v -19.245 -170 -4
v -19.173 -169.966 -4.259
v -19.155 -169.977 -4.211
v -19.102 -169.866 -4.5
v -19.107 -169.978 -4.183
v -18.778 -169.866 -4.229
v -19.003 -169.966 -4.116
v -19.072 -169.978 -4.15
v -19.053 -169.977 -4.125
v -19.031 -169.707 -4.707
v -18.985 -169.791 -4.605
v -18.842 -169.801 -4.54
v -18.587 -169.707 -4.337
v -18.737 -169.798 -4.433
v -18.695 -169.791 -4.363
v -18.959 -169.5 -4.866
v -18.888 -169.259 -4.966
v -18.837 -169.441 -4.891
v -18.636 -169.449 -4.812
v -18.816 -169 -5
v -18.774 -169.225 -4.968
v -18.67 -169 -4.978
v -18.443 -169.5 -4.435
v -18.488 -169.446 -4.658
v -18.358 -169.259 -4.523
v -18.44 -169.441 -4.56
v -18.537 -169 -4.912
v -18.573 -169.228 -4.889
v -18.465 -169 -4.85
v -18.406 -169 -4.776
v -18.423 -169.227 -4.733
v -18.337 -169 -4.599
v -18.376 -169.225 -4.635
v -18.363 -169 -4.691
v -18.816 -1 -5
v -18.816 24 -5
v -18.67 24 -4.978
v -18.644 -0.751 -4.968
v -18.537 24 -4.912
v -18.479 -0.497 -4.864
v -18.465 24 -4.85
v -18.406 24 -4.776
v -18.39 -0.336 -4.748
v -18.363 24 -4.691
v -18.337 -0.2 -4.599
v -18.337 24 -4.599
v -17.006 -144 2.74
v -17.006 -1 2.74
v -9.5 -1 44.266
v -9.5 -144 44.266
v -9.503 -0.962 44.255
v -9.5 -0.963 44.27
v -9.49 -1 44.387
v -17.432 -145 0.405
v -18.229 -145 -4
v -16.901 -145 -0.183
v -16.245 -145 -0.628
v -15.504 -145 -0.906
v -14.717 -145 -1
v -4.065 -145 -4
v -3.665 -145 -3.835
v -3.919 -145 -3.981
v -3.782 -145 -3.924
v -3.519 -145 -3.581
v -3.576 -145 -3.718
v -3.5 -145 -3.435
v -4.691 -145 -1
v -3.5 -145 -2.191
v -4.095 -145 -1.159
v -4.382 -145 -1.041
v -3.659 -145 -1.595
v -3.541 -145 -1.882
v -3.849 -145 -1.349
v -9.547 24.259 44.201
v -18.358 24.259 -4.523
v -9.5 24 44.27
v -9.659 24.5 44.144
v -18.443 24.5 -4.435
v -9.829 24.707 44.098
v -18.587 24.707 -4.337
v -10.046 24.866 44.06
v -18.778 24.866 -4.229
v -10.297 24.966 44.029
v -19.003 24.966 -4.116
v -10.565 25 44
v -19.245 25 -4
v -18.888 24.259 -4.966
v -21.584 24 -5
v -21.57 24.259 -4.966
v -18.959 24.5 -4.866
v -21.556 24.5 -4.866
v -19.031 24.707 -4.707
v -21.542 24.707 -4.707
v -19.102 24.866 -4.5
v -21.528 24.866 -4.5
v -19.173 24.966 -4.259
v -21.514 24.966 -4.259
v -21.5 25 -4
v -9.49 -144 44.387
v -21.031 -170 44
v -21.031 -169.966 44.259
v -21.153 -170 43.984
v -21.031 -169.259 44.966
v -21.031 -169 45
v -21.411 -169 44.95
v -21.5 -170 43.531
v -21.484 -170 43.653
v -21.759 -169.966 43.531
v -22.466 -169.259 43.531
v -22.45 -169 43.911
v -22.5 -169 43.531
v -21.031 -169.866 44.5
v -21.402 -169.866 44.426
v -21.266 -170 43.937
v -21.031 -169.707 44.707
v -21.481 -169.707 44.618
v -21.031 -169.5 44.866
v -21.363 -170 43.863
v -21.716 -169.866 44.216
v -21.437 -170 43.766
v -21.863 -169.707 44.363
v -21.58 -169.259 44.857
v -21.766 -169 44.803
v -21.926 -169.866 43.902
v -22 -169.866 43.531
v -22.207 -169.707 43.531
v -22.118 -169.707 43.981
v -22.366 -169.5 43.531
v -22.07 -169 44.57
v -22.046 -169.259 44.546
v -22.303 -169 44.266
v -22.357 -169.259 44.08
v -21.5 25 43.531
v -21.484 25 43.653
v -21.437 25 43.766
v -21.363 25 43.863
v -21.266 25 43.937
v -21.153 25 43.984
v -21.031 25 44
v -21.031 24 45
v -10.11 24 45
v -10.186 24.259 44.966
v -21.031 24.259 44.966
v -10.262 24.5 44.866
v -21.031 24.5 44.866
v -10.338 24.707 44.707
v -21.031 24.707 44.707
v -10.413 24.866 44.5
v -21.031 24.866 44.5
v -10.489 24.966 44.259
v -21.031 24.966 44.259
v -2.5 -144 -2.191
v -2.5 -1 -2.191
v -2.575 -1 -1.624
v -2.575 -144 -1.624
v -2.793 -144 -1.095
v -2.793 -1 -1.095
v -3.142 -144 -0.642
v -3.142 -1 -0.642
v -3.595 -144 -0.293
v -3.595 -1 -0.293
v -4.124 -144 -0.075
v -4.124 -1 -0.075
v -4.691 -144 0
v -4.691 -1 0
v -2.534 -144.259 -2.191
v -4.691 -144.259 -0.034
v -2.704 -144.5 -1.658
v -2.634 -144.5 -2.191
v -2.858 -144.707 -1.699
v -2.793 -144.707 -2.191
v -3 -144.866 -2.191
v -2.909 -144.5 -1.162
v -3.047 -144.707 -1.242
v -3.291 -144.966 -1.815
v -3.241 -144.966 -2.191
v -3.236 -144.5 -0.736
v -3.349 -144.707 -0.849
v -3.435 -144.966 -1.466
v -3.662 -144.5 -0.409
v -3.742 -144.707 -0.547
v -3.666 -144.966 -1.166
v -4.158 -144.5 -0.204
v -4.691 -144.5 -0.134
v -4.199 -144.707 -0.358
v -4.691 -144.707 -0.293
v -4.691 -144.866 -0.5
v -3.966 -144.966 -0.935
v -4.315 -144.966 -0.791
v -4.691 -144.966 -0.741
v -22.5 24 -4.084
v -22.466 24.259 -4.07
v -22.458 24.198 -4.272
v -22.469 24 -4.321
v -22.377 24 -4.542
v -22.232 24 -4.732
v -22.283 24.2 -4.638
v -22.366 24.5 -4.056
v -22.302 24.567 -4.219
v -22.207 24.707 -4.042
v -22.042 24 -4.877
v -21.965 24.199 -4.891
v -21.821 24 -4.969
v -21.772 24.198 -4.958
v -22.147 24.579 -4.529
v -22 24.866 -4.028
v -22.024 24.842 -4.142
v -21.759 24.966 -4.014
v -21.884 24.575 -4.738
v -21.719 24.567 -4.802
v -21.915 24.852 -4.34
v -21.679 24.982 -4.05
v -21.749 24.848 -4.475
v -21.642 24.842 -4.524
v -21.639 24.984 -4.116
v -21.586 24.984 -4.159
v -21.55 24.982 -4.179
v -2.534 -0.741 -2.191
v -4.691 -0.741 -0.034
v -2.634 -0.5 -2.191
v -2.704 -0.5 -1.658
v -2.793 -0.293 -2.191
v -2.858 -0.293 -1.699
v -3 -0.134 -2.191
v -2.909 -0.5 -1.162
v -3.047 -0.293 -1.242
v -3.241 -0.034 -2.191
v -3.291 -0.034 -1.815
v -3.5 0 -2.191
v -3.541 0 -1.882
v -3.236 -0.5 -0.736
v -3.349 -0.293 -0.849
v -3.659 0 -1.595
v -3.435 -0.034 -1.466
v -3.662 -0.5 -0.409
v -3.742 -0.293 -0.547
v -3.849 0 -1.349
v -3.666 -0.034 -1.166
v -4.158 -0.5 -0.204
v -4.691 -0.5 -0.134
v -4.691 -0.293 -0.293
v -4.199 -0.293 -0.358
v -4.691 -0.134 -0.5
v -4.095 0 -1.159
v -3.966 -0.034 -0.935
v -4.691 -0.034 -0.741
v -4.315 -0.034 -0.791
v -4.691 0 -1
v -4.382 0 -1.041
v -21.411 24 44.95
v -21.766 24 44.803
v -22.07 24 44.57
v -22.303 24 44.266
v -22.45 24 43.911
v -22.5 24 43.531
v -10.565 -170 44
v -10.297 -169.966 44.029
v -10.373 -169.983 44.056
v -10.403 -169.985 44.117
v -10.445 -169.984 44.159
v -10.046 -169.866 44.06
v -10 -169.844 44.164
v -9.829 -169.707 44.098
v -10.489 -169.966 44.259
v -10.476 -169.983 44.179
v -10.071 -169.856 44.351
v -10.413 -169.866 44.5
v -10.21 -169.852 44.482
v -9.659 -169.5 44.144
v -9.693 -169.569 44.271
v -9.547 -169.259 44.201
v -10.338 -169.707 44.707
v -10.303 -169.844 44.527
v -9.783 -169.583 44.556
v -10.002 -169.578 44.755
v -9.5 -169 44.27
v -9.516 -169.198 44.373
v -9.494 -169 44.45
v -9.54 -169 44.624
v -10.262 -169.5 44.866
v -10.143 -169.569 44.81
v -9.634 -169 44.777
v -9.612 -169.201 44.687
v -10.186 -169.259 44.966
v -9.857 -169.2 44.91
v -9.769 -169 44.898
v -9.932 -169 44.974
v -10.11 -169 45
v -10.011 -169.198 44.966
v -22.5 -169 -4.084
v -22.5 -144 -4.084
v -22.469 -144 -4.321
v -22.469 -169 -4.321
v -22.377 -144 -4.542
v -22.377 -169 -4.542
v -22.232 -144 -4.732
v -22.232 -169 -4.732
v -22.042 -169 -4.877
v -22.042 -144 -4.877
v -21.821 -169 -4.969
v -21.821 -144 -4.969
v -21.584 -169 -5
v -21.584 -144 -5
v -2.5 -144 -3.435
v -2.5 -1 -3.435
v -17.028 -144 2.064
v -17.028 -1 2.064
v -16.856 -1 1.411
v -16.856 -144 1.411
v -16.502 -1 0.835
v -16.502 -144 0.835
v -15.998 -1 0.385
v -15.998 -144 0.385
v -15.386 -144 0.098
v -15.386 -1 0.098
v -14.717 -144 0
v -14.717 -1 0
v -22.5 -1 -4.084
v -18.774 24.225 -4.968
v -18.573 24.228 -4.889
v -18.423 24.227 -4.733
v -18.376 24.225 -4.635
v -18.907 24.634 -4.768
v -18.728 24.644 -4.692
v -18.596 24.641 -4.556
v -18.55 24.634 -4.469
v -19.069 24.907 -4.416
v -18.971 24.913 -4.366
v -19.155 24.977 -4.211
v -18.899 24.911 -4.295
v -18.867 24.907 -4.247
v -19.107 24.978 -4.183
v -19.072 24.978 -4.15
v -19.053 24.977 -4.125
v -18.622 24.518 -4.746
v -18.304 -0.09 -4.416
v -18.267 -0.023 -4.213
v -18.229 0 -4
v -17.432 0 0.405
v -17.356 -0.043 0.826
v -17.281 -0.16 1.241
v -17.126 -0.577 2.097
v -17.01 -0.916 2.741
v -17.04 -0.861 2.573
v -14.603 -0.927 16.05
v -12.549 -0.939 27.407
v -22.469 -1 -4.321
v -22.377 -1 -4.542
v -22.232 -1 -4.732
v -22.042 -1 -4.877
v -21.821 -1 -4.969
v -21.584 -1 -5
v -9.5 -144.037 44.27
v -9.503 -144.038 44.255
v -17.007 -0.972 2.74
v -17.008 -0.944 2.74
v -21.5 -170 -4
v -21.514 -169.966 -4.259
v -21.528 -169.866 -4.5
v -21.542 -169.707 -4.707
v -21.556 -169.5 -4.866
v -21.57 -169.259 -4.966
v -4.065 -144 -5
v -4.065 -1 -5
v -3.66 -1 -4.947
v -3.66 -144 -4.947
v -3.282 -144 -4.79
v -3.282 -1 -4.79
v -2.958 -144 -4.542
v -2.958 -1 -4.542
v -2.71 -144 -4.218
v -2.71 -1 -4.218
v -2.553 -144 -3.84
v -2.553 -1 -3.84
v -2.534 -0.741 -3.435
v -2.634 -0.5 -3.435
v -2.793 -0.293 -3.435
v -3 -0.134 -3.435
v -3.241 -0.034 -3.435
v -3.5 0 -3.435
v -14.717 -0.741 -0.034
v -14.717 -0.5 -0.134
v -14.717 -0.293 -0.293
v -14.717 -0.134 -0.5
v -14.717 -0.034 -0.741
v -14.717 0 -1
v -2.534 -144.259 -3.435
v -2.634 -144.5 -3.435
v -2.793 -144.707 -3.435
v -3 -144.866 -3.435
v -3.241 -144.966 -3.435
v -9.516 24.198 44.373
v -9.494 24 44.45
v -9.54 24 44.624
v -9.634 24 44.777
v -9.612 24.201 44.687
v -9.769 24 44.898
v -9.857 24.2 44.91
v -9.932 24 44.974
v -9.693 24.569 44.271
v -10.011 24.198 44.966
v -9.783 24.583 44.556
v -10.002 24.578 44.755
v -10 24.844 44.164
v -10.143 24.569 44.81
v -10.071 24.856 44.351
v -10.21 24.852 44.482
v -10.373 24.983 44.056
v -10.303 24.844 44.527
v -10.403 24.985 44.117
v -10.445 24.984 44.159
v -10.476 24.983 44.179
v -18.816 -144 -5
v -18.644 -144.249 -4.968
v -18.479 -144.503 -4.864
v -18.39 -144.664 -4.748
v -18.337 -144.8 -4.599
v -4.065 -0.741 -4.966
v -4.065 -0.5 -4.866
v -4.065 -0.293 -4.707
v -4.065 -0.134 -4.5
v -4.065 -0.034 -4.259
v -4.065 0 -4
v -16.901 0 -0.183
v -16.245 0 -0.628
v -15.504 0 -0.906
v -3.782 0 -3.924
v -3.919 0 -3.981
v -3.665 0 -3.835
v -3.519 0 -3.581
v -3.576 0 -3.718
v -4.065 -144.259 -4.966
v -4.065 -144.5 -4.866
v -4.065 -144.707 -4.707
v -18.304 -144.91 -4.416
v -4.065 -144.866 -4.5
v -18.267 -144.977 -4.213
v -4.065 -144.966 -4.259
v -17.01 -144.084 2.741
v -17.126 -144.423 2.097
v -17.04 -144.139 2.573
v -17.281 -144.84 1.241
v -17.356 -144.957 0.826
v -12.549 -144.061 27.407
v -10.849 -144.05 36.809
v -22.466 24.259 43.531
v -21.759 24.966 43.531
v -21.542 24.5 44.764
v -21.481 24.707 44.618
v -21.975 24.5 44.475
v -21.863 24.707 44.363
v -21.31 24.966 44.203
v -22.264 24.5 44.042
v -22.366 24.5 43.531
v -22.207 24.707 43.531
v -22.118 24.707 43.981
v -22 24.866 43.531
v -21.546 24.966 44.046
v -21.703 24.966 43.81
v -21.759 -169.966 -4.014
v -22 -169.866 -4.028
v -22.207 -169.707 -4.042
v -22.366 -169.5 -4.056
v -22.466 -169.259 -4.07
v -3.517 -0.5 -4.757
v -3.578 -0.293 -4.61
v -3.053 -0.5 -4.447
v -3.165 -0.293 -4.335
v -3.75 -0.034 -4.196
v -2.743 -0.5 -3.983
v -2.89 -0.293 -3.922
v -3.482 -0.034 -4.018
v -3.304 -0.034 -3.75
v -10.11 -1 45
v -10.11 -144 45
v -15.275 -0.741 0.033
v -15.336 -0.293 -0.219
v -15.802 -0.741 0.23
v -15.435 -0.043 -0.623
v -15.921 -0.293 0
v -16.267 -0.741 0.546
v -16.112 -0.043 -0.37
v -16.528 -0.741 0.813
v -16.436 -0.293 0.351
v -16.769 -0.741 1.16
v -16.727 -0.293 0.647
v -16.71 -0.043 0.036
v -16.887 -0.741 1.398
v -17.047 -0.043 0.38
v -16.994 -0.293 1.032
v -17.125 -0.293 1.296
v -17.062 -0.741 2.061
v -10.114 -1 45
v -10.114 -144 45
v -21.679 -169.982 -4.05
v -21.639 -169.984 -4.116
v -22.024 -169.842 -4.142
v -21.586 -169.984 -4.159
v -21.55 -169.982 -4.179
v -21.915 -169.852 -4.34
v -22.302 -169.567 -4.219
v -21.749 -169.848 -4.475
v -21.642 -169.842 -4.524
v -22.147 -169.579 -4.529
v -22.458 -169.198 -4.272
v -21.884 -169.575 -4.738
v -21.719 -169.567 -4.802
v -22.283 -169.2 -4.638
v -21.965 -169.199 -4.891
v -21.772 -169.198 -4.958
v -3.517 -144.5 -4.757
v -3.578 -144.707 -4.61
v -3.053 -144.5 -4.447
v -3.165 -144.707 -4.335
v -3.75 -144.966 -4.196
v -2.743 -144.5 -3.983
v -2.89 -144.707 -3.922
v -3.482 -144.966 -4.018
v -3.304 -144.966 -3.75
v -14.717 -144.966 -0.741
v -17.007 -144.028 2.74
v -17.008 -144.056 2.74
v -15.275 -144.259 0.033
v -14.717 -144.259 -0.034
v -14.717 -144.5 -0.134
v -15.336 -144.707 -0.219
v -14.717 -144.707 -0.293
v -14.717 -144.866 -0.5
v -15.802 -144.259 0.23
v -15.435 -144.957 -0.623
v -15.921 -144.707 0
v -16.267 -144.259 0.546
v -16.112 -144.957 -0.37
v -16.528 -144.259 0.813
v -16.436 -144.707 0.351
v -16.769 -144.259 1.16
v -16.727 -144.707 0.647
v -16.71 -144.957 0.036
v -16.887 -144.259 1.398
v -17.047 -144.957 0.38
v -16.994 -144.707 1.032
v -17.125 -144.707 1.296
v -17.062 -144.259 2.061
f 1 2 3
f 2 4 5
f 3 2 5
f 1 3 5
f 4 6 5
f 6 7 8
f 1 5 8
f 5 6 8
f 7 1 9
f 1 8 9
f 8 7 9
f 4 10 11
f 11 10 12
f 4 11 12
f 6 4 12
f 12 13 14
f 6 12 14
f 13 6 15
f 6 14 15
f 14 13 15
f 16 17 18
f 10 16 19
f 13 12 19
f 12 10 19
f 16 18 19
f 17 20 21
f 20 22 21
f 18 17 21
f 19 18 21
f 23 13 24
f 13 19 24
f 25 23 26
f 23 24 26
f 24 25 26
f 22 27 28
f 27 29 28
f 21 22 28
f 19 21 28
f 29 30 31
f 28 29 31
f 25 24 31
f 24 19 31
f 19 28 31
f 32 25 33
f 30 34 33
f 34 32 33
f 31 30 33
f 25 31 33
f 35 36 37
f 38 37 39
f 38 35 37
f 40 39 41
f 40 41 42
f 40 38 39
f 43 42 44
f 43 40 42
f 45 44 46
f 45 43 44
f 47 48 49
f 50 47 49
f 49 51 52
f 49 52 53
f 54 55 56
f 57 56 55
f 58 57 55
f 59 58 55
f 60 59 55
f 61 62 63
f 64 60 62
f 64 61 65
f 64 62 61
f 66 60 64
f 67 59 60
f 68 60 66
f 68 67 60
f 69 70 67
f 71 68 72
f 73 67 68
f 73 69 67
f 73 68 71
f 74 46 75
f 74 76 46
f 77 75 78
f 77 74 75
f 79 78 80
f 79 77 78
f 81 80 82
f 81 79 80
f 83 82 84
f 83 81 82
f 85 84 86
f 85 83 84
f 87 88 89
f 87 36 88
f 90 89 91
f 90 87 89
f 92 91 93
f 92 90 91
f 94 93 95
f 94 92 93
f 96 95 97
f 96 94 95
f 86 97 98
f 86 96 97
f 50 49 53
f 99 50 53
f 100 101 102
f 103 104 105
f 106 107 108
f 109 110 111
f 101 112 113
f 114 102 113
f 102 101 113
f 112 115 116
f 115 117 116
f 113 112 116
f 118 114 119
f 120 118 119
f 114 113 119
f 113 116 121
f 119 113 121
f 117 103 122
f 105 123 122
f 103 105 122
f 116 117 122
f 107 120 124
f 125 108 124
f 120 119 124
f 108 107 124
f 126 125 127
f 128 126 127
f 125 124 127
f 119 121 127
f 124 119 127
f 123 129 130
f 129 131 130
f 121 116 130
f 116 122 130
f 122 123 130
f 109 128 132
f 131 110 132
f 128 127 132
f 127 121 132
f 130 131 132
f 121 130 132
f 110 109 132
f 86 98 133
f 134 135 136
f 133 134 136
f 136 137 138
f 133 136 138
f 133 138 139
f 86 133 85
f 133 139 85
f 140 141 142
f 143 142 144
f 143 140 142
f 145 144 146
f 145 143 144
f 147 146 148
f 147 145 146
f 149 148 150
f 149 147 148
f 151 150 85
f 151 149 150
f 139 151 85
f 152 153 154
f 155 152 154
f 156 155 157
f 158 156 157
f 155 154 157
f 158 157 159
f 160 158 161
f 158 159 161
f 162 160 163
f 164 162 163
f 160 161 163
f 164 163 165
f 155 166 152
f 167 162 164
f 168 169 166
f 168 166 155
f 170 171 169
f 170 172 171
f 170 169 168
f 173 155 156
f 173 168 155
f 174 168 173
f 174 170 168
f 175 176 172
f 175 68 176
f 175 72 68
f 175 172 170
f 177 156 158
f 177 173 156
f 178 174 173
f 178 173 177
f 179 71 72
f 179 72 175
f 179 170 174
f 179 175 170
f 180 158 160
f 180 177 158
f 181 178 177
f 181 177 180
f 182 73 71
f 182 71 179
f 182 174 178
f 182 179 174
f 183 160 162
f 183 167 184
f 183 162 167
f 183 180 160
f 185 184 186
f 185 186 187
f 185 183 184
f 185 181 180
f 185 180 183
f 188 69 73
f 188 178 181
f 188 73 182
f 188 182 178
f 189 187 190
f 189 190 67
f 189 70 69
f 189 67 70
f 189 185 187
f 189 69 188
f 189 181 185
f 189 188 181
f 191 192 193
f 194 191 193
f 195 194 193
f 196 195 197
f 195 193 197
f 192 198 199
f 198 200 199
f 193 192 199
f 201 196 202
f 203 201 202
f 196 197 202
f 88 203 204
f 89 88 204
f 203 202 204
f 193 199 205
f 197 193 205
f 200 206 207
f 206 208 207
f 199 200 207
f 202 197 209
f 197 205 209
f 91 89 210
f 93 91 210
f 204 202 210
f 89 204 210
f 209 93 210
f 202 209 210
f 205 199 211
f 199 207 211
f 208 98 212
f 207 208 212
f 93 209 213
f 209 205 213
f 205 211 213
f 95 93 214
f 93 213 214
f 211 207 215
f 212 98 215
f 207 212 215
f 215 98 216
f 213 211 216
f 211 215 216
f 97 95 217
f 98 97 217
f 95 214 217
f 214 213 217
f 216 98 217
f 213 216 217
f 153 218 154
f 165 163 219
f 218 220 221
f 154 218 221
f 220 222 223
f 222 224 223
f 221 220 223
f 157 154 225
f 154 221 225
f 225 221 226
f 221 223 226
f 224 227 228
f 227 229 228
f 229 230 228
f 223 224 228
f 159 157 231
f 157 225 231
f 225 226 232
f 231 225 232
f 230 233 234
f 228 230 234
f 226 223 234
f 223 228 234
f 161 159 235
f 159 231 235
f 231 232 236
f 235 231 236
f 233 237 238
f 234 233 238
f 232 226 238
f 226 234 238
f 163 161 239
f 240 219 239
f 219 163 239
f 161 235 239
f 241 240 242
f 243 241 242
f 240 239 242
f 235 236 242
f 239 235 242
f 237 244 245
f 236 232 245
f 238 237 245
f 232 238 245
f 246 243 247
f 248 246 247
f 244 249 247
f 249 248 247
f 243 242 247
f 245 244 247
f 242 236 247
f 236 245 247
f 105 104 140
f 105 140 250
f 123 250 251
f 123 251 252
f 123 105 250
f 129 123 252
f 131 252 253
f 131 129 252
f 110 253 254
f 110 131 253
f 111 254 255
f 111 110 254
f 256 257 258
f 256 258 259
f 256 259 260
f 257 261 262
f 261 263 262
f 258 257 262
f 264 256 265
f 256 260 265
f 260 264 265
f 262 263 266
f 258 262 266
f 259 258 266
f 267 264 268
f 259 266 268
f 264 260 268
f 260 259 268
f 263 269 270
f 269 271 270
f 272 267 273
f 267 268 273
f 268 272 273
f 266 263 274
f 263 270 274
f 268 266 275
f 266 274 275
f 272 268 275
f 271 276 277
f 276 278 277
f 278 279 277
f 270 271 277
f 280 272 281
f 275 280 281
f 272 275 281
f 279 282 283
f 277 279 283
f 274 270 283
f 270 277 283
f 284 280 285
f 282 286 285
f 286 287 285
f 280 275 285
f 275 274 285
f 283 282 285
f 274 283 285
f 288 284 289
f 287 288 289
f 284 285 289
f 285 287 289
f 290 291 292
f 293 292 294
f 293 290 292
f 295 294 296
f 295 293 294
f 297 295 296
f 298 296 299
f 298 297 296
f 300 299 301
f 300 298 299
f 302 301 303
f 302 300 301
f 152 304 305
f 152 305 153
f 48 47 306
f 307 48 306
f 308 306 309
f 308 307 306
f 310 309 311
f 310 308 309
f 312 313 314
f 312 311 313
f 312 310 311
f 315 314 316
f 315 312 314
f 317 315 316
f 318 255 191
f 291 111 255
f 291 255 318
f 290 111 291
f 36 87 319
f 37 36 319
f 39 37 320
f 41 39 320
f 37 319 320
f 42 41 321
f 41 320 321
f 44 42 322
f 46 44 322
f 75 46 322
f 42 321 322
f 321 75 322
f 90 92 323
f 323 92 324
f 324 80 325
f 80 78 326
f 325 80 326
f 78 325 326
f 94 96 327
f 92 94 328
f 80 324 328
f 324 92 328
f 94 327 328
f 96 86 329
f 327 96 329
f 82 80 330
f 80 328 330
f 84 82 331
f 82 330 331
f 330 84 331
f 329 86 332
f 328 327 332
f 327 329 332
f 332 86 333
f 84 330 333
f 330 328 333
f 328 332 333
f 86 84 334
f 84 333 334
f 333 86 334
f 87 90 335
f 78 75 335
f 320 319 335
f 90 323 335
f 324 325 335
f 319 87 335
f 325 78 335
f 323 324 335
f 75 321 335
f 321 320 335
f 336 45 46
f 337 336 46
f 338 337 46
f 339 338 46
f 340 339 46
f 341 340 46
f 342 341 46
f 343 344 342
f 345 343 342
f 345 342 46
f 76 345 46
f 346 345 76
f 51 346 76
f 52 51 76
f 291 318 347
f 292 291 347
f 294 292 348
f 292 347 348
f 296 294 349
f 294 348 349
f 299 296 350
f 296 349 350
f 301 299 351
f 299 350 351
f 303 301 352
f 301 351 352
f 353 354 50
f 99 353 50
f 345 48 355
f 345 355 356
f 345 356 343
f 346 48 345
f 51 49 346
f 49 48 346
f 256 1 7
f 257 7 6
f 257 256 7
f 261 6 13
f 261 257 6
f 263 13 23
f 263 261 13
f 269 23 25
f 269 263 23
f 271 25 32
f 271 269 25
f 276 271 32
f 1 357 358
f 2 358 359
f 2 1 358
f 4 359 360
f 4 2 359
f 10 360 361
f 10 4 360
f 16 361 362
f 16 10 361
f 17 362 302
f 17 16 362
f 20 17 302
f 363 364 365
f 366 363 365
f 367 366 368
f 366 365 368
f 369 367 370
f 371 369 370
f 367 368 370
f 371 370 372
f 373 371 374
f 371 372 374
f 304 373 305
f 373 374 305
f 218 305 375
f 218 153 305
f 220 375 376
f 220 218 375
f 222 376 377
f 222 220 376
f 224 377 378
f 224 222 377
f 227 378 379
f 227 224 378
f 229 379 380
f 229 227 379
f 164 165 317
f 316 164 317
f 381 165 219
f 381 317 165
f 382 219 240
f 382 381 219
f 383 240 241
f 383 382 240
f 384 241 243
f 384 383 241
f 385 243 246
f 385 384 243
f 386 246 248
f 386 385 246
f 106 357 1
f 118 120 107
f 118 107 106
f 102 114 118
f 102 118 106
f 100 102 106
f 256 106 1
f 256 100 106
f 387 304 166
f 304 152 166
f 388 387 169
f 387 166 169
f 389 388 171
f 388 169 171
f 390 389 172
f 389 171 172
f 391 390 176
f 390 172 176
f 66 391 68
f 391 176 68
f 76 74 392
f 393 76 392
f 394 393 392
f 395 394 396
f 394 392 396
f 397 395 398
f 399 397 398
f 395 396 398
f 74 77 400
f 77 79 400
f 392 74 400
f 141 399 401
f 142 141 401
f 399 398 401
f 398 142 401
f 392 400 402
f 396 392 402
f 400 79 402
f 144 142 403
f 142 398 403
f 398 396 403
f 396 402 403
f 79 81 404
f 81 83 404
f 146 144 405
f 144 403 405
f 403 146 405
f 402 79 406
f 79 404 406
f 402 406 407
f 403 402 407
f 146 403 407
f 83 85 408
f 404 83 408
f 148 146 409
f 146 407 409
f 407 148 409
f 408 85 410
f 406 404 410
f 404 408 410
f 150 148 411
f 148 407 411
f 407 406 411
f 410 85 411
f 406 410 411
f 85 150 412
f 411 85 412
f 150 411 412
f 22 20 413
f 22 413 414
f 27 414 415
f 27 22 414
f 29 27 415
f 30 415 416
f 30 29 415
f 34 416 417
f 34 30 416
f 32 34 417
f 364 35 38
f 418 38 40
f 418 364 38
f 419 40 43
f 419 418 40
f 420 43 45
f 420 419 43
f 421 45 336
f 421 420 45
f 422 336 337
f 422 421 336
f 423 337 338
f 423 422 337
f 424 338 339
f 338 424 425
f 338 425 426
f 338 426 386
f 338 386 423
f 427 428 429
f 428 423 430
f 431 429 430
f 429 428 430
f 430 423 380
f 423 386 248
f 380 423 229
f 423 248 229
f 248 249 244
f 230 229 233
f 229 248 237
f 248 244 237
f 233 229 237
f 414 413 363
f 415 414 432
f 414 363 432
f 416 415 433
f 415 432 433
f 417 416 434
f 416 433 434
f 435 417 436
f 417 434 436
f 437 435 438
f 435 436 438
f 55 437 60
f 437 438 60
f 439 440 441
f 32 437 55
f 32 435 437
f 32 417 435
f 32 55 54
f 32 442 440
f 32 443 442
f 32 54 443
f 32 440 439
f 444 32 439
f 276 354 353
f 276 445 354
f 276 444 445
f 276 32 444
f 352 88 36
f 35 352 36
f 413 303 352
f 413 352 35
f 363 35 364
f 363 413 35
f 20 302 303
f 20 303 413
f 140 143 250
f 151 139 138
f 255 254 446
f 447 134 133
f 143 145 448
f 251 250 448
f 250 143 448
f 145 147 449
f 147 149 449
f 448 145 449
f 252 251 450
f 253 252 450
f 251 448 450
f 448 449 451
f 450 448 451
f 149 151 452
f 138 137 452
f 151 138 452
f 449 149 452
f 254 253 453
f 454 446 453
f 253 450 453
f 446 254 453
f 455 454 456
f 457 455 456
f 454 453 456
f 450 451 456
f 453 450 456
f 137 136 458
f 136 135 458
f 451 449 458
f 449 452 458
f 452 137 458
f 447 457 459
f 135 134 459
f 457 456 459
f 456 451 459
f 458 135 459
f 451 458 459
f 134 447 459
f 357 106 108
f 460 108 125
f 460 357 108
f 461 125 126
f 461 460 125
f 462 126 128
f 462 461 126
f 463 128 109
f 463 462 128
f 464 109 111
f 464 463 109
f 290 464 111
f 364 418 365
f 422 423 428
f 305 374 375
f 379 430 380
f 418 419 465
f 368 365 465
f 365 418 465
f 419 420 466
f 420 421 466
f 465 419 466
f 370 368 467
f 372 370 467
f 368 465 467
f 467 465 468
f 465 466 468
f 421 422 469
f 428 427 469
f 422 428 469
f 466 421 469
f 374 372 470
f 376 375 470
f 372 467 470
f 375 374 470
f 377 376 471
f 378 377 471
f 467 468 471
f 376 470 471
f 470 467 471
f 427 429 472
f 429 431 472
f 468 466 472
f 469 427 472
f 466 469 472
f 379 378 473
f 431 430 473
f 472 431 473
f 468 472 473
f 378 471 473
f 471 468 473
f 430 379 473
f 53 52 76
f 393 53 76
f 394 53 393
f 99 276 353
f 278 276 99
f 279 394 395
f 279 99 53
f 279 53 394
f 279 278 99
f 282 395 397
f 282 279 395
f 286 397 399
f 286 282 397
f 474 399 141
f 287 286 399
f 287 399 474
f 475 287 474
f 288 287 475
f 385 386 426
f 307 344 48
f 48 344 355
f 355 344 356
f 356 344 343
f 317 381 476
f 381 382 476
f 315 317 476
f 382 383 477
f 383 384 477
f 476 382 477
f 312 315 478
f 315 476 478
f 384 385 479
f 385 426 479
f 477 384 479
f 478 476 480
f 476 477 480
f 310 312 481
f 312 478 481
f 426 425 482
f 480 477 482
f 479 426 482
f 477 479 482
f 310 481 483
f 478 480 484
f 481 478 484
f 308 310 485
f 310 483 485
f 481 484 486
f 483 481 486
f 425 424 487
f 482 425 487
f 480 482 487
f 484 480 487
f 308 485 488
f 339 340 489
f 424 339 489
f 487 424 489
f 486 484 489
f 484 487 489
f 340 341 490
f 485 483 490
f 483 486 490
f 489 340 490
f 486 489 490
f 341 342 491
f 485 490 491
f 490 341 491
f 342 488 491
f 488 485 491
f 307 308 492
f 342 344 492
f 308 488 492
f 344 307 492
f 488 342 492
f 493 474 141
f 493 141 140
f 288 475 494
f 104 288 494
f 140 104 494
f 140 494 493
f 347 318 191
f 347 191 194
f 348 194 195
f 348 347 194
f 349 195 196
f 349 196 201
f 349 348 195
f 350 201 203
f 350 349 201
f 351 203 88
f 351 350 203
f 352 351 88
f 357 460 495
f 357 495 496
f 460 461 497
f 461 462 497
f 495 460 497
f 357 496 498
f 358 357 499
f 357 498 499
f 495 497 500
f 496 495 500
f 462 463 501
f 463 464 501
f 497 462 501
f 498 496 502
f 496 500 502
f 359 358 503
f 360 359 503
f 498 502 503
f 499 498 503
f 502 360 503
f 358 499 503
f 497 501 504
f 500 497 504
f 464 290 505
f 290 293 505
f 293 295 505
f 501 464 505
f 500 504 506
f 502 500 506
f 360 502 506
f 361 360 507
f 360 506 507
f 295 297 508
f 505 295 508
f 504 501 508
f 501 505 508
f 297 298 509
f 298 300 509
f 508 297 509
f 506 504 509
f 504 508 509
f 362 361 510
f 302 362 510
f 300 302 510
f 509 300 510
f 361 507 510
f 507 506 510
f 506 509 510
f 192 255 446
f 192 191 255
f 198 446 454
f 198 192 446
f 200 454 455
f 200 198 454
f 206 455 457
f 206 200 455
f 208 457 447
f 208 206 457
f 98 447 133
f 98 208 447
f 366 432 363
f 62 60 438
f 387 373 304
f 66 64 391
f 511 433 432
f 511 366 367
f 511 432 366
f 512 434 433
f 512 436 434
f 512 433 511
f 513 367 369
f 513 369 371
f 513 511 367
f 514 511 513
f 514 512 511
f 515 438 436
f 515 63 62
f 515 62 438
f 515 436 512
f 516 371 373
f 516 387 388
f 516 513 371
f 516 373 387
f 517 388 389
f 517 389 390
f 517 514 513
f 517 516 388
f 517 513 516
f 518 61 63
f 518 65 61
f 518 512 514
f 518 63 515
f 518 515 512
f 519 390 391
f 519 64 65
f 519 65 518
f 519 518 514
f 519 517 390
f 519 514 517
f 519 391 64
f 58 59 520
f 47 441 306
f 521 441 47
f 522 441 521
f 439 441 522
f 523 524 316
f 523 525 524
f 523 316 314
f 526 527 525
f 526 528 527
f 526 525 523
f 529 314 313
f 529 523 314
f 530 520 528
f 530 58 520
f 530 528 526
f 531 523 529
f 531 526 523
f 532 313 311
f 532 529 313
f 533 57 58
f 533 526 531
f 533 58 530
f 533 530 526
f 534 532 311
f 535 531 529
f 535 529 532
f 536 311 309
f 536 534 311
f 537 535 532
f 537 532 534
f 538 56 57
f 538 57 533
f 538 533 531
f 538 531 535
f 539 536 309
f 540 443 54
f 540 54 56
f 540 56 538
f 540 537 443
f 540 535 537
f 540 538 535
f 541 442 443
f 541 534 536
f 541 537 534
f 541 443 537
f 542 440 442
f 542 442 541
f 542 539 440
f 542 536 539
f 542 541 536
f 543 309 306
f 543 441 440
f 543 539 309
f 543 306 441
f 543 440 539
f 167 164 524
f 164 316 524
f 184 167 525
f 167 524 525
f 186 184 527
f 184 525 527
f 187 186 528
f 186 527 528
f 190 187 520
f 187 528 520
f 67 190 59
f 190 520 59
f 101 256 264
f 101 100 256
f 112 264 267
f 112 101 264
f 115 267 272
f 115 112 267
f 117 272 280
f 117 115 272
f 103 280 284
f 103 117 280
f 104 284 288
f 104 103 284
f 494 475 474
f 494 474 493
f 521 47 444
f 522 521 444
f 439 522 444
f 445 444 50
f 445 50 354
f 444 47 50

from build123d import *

# Parameters (mm, degrees)
EXTRUDE001_DEPTH      = 170
EXTRUDE001_DEPTH_BACK = 25
EXTRUDE_DEPTH         = 145
FILLET_R              = 1
FILLET001_R           = 1


with BuildPart() as extrude001:
    # Sketch001 → Extrude001 (new body, two sides)
    with BuildSketch(Plane.XZ) as extrude001_sk:
        with BuildLine():
            Line((-18.336975, -4.599435), (-9.5, 44.269675))
            ThreePointArc((-9.5, 44.269675), (-9.634289, 44.777491), (-10.110105, 45))
            Line((-10.110105, 45), (-21.031197, 45))
            ThreePointArc((-21.031197, 45), (-22.069798, 44.569798), (-22.5, 43.531197))
            Line((-22.5, 43.531197), (-22.5, -4.084046))
            ThreePointArc((-22.5, -4.084046), (-22.231723, -4.731723), (-21.584046, -5))
            Line((-21.584046, -5), (-18.81647, -5))
            ThreePointArc((-18.81647, -5), (-18.504073, -4.886682), (-18.336975, -4.599435))
        make_face()
    extrude(amount=EXTRUDE001_DEPTH)
    extrude(extrude001_sk.sketch, amount=-EXTRUDE001_DEPTH_BACK)


with BuildPart() as fillet001:
    # Sketch → Extrude (new body)
    with BuildSketch(Plane.XZ):
        with BuildLine():
            Line((-4.690516, 0), (-14.717051, 0))
            ThreePointArc((-17.006162, 2.739987), (-16.502237, 0.834781), (-14.717051, 0))
            Line((-17.006162, 2.739987), (-9.5, 44.265571))
            ThreePointArc((-9.5, 44.265571), (-9.635072, 44.776244), (-10.113575, 45))
            Line((-10.113575, 45), (-21.031197, 45))
            ThreePointArc((-21.031197, 45), (-22.069798, 44.569798), (-22.5, 43.531197))
            Line((-22.5, 43.531197), (-22.5, -4.084046))
            ThreePointArc((-22.5, -4.084046), (-22.231723, -4.731723), (-21.584046, -5))
            Line((-21.584046, -5), (-4.064727, -5))
            ThreePointArc((-4.064727, -5), (-2.958298, -4.541702), (-2.5, -3.435273))
            Line((-2.5, -3.435273), (-2.5, -2.190516))
            ThreePointArc((-2.5, -2.190516), (-3.141587, -0.641587), (-4.690516, 0))
        make_face()
    extrude(amount=EXTRUDE_DEPTH)

    # Fillet
    fillet_edges = [fillet001.edges().sort_by_distance(p)[0] for p in [
        (-9.703783, 0, 0),
        (-9.703783, -145, 0),
        (-16.502237, 0, 0.834781),
        (-16.502237, -145, 0.834781),
        (-12.824386, 0, -5),
        (-12.824386, -145, -5),
        (-2.958298, 0, -4.541702),
        (-2.958298, -145, -4.541702),
        (-2.5, 0, -2.812895),
        (-2.5, -145, -2.812895),
        (-3.141587, 0, -0.641587),
        (-3.141587, -145, -0.641587),
    ]]
    fillet(fillet_edges, radius=FILLET_R)

    # Fusion: union Extrude001
    add(extrude001.part)

    # Fillet001
    fillet001_edges = [fillet001.edges().sort_by_distance(p)[0] for p in [
        (-13.918487, 25, 19.83512),
        (-13.918487, -170, 19.83512),
        (-9.634289, 25, 44.777491),
        (-15.570651, 25, 45),
        (-22.069798, 25, 44.569798),
        (-22.5, 25, 19.723576),
        (-22.231723, 25, -4.731723),
        (-20.200258, 25, -5),
        (-18.504073, 25, -4.886682),
        (-9.634289, -170, 44.777491),
        (-15.570651, -170, 45),
        (-22.069798, -170, 44.569798),
        (-22.5, -170, 19.723575),
        (-22.231723, -170, -4.731723),
        (-20.200258, -170, -5),
        (-18.504073, -170, -4.886682),
    ]]
    fillet(fillet001_edges, radius=FILLET001_R)


solid = fillet001.part
